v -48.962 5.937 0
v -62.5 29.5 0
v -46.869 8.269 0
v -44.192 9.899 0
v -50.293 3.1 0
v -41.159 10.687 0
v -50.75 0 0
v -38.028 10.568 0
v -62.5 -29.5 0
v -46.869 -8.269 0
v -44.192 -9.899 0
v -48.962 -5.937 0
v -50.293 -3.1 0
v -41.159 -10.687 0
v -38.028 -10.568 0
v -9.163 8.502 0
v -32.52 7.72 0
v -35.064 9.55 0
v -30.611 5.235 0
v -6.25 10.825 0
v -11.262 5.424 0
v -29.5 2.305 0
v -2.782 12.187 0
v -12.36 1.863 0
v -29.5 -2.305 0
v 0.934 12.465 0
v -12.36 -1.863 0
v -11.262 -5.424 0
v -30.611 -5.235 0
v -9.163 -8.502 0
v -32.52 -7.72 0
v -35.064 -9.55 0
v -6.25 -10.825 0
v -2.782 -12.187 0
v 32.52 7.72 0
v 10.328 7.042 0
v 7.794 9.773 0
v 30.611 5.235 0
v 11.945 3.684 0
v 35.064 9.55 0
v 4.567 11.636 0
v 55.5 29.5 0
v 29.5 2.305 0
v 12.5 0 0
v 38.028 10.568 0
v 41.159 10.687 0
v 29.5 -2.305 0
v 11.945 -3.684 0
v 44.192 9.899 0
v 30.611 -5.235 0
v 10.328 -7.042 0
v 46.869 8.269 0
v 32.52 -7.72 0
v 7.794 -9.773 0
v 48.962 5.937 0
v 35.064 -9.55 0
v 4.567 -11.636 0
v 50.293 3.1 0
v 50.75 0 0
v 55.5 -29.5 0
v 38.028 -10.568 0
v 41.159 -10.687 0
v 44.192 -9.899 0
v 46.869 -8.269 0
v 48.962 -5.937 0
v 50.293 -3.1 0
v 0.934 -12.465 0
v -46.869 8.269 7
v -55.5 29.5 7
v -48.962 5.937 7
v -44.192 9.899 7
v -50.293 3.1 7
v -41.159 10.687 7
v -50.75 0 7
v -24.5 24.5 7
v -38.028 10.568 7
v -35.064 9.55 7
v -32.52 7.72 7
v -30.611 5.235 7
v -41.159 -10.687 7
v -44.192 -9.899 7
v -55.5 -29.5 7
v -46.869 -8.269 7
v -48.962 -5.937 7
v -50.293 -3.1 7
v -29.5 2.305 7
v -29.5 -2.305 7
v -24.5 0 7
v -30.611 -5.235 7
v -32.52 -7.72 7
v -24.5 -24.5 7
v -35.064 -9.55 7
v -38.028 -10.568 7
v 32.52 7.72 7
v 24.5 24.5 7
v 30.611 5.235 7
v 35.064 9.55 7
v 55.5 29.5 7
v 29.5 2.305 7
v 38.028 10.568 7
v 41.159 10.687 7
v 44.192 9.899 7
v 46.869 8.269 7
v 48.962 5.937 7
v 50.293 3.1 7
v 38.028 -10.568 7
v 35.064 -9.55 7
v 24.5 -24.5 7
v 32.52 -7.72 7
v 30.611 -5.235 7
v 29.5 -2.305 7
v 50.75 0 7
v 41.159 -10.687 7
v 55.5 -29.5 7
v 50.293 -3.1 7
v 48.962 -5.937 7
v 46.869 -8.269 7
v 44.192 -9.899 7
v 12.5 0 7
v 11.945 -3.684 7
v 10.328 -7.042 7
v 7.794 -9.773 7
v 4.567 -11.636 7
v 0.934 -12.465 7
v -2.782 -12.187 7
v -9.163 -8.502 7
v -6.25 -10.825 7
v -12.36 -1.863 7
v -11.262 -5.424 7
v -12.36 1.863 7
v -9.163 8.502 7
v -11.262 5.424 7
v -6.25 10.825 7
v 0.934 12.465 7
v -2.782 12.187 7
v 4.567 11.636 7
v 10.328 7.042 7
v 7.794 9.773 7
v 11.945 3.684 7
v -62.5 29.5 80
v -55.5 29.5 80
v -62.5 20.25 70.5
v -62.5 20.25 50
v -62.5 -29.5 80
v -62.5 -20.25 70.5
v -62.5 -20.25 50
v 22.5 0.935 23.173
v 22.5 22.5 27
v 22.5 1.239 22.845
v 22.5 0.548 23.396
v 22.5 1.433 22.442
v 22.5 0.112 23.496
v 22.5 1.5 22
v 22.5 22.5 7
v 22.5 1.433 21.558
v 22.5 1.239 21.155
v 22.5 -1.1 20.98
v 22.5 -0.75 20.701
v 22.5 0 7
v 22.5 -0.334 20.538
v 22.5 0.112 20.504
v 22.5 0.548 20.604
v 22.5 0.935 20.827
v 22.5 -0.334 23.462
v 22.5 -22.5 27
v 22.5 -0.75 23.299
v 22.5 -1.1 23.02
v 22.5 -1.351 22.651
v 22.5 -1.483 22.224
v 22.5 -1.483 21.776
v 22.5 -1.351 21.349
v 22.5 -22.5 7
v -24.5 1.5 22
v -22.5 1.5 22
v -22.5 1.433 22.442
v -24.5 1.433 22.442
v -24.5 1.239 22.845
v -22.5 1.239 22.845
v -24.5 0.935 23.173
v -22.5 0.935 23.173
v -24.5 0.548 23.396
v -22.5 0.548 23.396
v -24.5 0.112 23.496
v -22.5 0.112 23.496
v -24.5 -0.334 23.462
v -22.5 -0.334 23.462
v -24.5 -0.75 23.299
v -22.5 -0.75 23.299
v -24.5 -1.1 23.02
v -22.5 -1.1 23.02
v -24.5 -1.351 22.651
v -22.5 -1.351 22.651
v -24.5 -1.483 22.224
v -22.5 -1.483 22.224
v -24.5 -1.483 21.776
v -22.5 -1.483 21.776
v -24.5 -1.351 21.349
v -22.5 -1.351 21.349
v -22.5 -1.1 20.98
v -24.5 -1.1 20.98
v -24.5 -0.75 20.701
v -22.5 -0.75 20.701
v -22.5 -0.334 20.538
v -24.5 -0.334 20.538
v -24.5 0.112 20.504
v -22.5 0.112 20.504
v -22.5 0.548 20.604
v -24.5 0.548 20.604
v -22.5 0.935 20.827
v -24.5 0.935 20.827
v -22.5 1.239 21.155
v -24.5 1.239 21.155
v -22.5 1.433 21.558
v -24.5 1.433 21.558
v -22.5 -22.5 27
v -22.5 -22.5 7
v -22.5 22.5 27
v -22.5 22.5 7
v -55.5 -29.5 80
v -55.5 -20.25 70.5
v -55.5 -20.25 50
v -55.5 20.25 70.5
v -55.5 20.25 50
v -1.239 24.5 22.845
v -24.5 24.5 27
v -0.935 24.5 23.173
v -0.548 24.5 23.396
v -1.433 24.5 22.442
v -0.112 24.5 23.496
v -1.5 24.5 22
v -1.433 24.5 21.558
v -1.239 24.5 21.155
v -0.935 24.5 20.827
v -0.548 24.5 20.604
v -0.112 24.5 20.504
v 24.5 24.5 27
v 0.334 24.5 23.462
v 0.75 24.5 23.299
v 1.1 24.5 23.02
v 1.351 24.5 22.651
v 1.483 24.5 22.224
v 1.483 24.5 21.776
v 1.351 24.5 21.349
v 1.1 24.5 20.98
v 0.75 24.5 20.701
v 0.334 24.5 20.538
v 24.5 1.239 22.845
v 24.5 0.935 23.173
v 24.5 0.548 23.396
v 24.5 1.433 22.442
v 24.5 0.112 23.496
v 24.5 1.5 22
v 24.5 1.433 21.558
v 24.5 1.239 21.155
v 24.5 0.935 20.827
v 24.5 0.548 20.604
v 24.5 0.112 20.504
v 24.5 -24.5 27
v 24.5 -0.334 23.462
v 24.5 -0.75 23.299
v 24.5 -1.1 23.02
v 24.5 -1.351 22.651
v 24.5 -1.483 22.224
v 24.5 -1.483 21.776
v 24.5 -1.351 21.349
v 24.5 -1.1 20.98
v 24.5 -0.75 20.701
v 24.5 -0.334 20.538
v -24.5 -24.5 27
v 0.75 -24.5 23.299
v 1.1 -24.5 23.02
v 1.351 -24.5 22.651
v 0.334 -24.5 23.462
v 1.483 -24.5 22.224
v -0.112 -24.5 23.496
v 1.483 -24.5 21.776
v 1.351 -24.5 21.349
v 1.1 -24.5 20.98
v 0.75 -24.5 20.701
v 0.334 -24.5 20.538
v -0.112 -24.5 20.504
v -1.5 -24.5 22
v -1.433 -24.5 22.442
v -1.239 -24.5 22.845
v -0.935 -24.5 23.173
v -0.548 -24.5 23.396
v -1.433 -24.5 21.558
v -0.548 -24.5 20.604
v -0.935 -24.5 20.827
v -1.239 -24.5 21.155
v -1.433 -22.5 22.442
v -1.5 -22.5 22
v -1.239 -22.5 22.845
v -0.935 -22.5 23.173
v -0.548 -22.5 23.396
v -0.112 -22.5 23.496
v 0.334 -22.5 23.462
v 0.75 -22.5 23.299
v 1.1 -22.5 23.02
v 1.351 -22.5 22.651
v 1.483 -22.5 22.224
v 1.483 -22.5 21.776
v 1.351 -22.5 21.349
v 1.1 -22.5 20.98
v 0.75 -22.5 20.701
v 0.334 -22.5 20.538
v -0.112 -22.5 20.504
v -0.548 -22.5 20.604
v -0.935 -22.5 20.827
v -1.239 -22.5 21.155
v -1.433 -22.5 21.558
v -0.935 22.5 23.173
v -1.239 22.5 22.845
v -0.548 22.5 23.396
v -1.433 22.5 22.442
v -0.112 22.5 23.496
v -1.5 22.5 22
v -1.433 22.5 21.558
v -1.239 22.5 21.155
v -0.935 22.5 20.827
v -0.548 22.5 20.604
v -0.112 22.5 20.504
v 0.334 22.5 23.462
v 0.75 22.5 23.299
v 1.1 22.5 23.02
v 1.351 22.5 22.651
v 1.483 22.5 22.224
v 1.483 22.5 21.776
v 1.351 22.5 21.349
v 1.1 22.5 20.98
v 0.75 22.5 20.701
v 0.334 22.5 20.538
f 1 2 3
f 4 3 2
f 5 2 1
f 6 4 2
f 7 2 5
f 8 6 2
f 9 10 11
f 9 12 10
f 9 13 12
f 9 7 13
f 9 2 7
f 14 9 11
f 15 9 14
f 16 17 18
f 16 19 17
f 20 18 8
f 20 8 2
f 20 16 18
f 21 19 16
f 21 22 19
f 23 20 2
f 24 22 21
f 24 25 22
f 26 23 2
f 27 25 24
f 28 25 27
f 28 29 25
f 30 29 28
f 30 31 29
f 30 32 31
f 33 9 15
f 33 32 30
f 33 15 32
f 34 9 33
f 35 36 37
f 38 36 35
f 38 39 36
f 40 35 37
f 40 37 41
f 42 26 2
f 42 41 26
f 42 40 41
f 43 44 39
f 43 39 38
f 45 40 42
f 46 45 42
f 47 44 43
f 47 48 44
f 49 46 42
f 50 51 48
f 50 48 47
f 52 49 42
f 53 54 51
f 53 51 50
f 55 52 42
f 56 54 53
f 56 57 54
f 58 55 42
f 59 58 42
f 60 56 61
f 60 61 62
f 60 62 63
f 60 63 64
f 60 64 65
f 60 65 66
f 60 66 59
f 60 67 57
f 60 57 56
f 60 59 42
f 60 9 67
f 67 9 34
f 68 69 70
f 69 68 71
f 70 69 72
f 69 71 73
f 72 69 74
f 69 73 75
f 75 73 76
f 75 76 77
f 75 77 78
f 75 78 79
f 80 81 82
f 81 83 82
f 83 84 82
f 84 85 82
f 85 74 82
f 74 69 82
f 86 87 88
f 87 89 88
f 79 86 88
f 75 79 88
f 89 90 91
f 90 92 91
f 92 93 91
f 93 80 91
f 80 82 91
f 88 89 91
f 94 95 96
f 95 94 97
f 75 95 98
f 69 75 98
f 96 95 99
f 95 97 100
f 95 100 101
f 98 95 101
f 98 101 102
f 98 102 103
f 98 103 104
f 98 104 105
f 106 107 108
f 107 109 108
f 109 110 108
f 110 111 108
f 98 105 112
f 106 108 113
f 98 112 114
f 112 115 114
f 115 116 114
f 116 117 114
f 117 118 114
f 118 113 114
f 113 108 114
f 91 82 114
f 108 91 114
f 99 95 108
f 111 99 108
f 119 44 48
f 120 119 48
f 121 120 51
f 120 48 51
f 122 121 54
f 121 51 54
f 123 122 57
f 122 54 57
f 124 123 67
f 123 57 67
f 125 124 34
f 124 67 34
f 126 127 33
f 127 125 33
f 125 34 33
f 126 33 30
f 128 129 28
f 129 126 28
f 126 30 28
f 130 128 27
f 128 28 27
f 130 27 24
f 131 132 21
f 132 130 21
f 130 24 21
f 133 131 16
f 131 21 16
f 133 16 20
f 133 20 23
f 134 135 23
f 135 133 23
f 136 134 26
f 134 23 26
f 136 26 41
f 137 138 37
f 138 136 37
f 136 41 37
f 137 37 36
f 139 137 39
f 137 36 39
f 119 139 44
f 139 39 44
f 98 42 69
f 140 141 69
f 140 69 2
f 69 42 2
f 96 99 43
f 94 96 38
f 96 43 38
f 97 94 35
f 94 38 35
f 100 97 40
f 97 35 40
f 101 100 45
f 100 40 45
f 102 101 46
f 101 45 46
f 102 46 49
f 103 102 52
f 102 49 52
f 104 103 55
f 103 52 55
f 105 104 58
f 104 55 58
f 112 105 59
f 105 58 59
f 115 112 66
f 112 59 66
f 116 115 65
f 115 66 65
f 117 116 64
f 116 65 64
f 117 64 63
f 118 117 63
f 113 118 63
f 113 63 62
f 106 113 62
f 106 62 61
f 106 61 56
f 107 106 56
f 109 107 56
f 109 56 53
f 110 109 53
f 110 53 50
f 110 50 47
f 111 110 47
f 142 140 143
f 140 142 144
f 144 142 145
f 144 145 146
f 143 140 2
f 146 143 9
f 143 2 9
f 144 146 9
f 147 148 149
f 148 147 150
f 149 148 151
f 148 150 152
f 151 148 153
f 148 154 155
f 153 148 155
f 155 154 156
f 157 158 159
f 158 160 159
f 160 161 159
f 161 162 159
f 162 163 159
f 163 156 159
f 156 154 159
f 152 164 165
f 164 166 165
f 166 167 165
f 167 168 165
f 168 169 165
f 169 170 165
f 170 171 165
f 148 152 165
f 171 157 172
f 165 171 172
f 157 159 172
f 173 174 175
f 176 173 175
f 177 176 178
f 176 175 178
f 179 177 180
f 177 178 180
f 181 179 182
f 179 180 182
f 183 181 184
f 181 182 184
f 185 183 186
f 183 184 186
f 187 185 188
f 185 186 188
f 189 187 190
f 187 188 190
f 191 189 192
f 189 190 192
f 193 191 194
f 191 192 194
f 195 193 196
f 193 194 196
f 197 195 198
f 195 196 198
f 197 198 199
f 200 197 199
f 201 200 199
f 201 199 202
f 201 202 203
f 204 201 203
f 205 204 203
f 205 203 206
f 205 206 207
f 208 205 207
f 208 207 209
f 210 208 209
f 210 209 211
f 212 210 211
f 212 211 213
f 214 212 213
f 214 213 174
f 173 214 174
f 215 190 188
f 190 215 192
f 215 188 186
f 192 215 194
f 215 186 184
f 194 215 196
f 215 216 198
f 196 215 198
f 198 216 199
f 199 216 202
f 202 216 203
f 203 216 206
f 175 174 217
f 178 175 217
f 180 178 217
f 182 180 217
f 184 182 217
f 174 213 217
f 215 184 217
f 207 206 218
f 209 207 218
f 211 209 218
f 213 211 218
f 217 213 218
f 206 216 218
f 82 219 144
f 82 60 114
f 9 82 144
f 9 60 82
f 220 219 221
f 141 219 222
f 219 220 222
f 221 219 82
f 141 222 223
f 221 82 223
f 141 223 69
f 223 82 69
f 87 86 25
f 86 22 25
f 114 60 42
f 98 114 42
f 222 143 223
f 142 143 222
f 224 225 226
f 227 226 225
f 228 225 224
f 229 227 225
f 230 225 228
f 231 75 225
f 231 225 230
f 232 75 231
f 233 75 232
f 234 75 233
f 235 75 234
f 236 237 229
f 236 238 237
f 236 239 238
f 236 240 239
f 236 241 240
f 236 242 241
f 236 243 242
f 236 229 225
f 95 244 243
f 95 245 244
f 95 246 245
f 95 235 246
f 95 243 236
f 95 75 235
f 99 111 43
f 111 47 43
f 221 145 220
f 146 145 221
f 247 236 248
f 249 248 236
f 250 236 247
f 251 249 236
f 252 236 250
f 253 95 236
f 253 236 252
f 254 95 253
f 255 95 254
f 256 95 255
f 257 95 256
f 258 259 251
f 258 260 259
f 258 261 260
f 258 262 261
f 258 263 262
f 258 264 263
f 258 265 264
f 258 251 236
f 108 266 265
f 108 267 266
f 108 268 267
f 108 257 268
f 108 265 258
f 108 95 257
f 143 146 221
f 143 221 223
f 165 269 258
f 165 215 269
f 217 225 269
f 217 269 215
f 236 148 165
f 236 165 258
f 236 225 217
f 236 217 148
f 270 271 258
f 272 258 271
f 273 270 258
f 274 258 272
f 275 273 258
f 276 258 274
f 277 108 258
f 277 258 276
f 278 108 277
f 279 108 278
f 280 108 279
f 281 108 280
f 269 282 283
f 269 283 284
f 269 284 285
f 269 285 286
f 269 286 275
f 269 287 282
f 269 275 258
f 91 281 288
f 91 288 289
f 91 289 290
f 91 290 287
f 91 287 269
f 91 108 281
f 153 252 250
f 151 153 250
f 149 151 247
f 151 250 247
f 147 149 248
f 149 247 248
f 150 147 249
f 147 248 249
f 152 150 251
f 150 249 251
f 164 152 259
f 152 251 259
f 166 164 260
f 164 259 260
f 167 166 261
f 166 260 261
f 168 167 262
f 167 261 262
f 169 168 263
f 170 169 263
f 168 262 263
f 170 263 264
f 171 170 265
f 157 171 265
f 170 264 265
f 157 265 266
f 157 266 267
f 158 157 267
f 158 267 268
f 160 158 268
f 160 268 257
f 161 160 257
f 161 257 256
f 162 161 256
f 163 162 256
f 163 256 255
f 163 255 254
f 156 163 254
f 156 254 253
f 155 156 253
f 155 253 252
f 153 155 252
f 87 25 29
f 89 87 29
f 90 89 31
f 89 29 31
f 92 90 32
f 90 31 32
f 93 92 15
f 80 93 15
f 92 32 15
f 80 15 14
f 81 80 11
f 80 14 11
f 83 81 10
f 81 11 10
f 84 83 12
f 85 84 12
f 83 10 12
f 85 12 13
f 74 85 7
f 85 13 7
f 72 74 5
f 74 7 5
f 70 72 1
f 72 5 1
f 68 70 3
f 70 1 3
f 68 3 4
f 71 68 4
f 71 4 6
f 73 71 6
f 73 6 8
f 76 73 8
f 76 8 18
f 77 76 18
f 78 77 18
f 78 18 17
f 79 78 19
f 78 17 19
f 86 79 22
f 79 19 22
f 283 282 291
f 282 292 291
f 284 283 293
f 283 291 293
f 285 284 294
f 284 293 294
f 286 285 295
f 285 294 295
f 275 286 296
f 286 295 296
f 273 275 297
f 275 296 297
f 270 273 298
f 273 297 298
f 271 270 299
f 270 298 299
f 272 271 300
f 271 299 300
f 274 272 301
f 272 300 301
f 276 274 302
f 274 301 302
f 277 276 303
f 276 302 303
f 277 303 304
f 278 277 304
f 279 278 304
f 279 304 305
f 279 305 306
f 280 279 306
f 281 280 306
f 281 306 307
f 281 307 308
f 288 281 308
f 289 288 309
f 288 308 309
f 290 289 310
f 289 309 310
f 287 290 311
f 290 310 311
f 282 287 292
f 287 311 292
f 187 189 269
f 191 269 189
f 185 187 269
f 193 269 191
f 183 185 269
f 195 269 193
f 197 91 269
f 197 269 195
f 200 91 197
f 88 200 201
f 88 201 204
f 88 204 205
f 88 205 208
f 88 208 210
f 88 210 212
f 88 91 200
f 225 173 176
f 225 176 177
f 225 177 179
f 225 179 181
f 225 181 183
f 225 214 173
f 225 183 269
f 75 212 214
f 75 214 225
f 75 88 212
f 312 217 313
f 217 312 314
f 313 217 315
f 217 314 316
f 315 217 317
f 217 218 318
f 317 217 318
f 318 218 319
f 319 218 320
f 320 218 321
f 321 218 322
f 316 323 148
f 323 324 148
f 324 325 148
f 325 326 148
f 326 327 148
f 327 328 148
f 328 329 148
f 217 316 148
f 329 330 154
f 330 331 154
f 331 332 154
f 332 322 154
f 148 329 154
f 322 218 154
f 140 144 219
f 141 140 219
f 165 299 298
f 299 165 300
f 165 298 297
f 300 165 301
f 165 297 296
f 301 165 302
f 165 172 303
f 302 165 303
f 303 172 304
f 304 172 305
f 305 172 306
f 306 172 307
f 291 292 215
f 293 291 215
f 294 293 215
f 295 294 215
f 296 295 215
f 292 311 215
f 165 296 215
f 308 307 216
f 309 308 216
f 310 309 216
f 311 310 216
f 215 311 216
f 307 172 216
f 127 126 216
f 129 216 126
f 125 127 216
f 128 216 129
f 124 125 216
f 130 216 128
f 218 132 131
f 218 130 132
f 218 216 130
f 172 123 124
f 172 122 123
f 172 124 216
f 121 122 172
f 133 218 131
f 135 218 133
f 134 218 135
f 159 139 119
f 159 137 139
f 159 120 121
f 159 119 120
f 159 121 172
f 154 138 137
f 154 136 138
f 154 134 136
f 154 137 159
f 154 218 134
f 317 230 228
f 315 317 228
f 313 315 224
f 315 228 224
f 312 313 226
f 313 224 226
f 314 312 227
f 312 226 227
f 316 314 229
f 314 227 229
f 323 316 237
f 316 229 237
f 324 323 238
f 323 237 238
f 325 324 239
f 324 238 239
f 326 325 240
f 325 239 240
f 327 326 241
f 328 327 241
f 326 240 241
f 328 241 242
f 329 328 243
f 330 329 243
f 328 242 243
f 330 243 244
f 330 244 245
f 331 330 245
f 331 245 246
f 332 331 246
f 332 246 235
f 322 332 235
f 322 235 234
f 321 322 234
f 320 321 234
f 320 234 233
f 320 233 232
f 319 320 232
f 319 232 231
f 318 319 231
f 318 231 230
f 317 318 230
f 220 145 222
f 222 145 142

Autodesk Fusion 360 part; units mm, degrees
sketch "Sketch1" plane through (0, 0, 0) normal (0, 0, 1) x (1, 0, 0)
  line L0 (0, 0) -> (22.5, 0)
  line L1 (22.5, 0) -> (22.5, -22.5)
  line L2 (22.5, -22.5) -> (-22.5, -22.5)
  line L3 (-22.5, -22.5) -> (-22.5, 22.5)
  line L4 (-22.5, 22.5) -> (22.5, 22.5)
  line L5 (22.5, 22.5) -> (22.5, 0)
  circle A0 centre (0, 0) radius 12.5
  line L6 (24.5, 0) -> (24.5, -24.5)
  line L7 (24.5, -24.5) -> (-24.5, -24.5)
  line L8 (-24.5, -24.5) -> (-24.5, 24.5)
  line L9 (-24.5, 24.5) -> (24.5, 24.5)
  line L10 (24.5, 24.5) -> (24.5, 0)
  dimension "d1" = 22.5
  dimension "d2" = 22.5
  dimension "d3" = 45
  dimension "d4" = 45
  dimension "d5" = 25
  dimension "d6" = -2
extrude "Extrude1" add sketch "Sketch1" along normal blind 7 contours L1 L2 L3 L4 L5
extrude "Extrude2" add sketch "Sketch1" along normal blind 27 contours L6 L7 L8 L9 L10
sketch "Sketch2" plane through (0, 0, 0) normal (0, 0, -1) x (1, 0, 0)
  line L0 (-24.5, -24.5) -> (24.5, -24.5)
  line L1 (24.5, -24.5) -> (24.5, 24.5)
  line L2 (24.5, 24.5) -> (-24.5, 24.5)
  line L3 (-24.5, 24.5) -> (-24.5, -24.5)
  circle A0 centre (0, 0) radius 12.5
  line L4 (0, 0) -> (-29.5, 0)
  line L5 (-29.5, 0) -> (-29.5, 29.5)
  line L6 (-29.5, 29.5) -> (29.5, 29.5)
  line L7 (29.5, 29.5) -> (29.5, -29.5)
  line L8 (29.5, -29.5) -> (-29.5, -29.5)
  line L9 (-29.5, -29.5) -> (-29.5, 0)
  line L10 (-29.5, 0) -> (-40, 0)
  line L11 (29.5, 0) -> (40, 0)
  circle A1 centre (-40, 0) radius 10.75
  circle A2 centre (40, 0) radius 10.75
  line L12 (55.5, 29.5) -> (55.5, -29.5)
  line L13 (-55.5, -29.5) -> (-55.5, 0)
  line L14 (-55.5, 0) -> (-55.5, 29.5)
  line L15 (-29.5, -29.5) -> (-55.5, -29.5)
  line L16 (-55.5, 29.5) -> (-29.5, 29.5)
  line L17 (29.5, 29.5) -> (55.5, 29.5)
  line L18 (55.5, -29.5) -> (29.5, -29.5)
  dimension "d11" = 29.5
  dimension "d12" = 29.5
  dimension "d13" = 59
  dimension "d14" = 59
  dimension "d15" = 59
  dimension "d16" = 10.5
  dimension "d17" = 10.5
  dimension "d18" = 21.5
  dimension "d19" = 21.5
  dimension "d20" = -26
  dimension "d21" = -26
extrude "Extrude3" add sketch "Sketch2" against normal blind 7 contours L5 L6 L7 L8 L9 A1 A2 | L5 L9 A1 L13 L14 L15 L16 | L7 A2 L12 L17 L18
sketch "Sketch3" plane through (0, 0, 0) normal (0, 0, -1) x (1, 0, 0)
  line L0 (55.5, -29.5) -> (55.5, 29.5)
  line L1 (55.5, 29.5) -> (-55.5, 29.5)
  line L2 (-55.5, 29.5) -> (-55.5, -29.5)
  line L3 (-55.5, -29.5) -> (55.5, -29.5)
  circle A0 centre (40, 0) radius 10.75
  circle A1 centre (-40, 0) radius 10.75
  circle A2 centre (0, 0) radius 12.5
  line L4 (-55.5, -29.5) -> (-62.5, -29.5)
  line L5 (-55.5, 29.5) -> (-62.5, 29.5)
  line L6 (-62.5, -29.5) -> (-62.5, 29.5)
  dimension "d24" = 7
  dimension "d25" = 7
extrude "Extrude4" add sketch "Sketch3" against normal blind 80 contours L2 L4 L5 L6
sketch "Sketch4" plane through (-62.5, 0, 0) normal (-1, 0, 0) x (0, -1, 0)
  line L0 (-29.5, 0) -> (29.5, 0)
  line L1 (29.5, 0) -> (29.5, 80)
  line L2 (29.5, 80) -> (-29.5, 80)
  line L3 (-29.5, 80) -> (-29.5, 0)
  line L4 (29.5, 70.5) -> (-29.5, 70.5)
  line L5 (0, 70.5) -> (20.25, 70.5)
  line L6 (20.25, 70.5) -> (20.25, 50)
  line L7 (20.25, 50) -> (-20.25, 50)
  line L8 (-20.25, 50) -> (-20.25, 70.5)
  line L9 (-20.25, 70.5) -> (20.25, 70.5)
  line L10 (22.25, 72.5) -> (22.25, 48)
  line L11 (22.25, 48) -> (-22.25, 48)
  line L12 (-22.25, 48) -> (-22.25, 72.5)
  line L13 (-22.25, 72.5) -> (22.25, 72.5)
  dimension "d28" = -9.5
  dimension "d29" = 20.25
  dimension "d30" = 20.5
  dimension "d31" = 40.5
  dimension "d32" = -2
extrude "Extrude5" cut sketch "Sketch4" against normal blind 7 contours L4 L5 L6 L7 L8 L9
sketch "Sketch5" plane through (24.5, 0, 0) normal (1, 0, 0) x (0, 1, 0)
  line L0 (-24.5, 7) -> (24.5, 7)
  line L1 (24.5, 7) -> (24.5, 27)
  line L2 (24.5, 27) -> (-24.5, 27)
  line L3 (-24.5, 27) -> (-24.5, 7)
  circle A0 centre (0, 22) radius 1.5
  dimension "d35" = 3
  dimension "d36" = 24.5
  dimension "d37" = 15
sketch "Sketch6" plane through (0, 24.5, 0) normal (0, 1, 0) x (-1, 0, 0)
  line L0 (-24.5, 7) -> (24.5, 7)
  line L1 (24.5, 7) -> (24.5, 27)
  line L2 (24.5, 27) -> (-24.5, 27)
  line L3 (-24.5, 27) -> (-24.5, 7)
  circle A0 centre (0, 22) radius 1.5
  dimension "d38" = 3
  dimension "d39" = 24.5
  dimension "d40" = 15
extrude "Extrude6" cut sketch "Sketch5" against normal blind 55 contours A0
extrude "Extrude7" cut sketch "Sketch6" against normal blind 55 contours A0
